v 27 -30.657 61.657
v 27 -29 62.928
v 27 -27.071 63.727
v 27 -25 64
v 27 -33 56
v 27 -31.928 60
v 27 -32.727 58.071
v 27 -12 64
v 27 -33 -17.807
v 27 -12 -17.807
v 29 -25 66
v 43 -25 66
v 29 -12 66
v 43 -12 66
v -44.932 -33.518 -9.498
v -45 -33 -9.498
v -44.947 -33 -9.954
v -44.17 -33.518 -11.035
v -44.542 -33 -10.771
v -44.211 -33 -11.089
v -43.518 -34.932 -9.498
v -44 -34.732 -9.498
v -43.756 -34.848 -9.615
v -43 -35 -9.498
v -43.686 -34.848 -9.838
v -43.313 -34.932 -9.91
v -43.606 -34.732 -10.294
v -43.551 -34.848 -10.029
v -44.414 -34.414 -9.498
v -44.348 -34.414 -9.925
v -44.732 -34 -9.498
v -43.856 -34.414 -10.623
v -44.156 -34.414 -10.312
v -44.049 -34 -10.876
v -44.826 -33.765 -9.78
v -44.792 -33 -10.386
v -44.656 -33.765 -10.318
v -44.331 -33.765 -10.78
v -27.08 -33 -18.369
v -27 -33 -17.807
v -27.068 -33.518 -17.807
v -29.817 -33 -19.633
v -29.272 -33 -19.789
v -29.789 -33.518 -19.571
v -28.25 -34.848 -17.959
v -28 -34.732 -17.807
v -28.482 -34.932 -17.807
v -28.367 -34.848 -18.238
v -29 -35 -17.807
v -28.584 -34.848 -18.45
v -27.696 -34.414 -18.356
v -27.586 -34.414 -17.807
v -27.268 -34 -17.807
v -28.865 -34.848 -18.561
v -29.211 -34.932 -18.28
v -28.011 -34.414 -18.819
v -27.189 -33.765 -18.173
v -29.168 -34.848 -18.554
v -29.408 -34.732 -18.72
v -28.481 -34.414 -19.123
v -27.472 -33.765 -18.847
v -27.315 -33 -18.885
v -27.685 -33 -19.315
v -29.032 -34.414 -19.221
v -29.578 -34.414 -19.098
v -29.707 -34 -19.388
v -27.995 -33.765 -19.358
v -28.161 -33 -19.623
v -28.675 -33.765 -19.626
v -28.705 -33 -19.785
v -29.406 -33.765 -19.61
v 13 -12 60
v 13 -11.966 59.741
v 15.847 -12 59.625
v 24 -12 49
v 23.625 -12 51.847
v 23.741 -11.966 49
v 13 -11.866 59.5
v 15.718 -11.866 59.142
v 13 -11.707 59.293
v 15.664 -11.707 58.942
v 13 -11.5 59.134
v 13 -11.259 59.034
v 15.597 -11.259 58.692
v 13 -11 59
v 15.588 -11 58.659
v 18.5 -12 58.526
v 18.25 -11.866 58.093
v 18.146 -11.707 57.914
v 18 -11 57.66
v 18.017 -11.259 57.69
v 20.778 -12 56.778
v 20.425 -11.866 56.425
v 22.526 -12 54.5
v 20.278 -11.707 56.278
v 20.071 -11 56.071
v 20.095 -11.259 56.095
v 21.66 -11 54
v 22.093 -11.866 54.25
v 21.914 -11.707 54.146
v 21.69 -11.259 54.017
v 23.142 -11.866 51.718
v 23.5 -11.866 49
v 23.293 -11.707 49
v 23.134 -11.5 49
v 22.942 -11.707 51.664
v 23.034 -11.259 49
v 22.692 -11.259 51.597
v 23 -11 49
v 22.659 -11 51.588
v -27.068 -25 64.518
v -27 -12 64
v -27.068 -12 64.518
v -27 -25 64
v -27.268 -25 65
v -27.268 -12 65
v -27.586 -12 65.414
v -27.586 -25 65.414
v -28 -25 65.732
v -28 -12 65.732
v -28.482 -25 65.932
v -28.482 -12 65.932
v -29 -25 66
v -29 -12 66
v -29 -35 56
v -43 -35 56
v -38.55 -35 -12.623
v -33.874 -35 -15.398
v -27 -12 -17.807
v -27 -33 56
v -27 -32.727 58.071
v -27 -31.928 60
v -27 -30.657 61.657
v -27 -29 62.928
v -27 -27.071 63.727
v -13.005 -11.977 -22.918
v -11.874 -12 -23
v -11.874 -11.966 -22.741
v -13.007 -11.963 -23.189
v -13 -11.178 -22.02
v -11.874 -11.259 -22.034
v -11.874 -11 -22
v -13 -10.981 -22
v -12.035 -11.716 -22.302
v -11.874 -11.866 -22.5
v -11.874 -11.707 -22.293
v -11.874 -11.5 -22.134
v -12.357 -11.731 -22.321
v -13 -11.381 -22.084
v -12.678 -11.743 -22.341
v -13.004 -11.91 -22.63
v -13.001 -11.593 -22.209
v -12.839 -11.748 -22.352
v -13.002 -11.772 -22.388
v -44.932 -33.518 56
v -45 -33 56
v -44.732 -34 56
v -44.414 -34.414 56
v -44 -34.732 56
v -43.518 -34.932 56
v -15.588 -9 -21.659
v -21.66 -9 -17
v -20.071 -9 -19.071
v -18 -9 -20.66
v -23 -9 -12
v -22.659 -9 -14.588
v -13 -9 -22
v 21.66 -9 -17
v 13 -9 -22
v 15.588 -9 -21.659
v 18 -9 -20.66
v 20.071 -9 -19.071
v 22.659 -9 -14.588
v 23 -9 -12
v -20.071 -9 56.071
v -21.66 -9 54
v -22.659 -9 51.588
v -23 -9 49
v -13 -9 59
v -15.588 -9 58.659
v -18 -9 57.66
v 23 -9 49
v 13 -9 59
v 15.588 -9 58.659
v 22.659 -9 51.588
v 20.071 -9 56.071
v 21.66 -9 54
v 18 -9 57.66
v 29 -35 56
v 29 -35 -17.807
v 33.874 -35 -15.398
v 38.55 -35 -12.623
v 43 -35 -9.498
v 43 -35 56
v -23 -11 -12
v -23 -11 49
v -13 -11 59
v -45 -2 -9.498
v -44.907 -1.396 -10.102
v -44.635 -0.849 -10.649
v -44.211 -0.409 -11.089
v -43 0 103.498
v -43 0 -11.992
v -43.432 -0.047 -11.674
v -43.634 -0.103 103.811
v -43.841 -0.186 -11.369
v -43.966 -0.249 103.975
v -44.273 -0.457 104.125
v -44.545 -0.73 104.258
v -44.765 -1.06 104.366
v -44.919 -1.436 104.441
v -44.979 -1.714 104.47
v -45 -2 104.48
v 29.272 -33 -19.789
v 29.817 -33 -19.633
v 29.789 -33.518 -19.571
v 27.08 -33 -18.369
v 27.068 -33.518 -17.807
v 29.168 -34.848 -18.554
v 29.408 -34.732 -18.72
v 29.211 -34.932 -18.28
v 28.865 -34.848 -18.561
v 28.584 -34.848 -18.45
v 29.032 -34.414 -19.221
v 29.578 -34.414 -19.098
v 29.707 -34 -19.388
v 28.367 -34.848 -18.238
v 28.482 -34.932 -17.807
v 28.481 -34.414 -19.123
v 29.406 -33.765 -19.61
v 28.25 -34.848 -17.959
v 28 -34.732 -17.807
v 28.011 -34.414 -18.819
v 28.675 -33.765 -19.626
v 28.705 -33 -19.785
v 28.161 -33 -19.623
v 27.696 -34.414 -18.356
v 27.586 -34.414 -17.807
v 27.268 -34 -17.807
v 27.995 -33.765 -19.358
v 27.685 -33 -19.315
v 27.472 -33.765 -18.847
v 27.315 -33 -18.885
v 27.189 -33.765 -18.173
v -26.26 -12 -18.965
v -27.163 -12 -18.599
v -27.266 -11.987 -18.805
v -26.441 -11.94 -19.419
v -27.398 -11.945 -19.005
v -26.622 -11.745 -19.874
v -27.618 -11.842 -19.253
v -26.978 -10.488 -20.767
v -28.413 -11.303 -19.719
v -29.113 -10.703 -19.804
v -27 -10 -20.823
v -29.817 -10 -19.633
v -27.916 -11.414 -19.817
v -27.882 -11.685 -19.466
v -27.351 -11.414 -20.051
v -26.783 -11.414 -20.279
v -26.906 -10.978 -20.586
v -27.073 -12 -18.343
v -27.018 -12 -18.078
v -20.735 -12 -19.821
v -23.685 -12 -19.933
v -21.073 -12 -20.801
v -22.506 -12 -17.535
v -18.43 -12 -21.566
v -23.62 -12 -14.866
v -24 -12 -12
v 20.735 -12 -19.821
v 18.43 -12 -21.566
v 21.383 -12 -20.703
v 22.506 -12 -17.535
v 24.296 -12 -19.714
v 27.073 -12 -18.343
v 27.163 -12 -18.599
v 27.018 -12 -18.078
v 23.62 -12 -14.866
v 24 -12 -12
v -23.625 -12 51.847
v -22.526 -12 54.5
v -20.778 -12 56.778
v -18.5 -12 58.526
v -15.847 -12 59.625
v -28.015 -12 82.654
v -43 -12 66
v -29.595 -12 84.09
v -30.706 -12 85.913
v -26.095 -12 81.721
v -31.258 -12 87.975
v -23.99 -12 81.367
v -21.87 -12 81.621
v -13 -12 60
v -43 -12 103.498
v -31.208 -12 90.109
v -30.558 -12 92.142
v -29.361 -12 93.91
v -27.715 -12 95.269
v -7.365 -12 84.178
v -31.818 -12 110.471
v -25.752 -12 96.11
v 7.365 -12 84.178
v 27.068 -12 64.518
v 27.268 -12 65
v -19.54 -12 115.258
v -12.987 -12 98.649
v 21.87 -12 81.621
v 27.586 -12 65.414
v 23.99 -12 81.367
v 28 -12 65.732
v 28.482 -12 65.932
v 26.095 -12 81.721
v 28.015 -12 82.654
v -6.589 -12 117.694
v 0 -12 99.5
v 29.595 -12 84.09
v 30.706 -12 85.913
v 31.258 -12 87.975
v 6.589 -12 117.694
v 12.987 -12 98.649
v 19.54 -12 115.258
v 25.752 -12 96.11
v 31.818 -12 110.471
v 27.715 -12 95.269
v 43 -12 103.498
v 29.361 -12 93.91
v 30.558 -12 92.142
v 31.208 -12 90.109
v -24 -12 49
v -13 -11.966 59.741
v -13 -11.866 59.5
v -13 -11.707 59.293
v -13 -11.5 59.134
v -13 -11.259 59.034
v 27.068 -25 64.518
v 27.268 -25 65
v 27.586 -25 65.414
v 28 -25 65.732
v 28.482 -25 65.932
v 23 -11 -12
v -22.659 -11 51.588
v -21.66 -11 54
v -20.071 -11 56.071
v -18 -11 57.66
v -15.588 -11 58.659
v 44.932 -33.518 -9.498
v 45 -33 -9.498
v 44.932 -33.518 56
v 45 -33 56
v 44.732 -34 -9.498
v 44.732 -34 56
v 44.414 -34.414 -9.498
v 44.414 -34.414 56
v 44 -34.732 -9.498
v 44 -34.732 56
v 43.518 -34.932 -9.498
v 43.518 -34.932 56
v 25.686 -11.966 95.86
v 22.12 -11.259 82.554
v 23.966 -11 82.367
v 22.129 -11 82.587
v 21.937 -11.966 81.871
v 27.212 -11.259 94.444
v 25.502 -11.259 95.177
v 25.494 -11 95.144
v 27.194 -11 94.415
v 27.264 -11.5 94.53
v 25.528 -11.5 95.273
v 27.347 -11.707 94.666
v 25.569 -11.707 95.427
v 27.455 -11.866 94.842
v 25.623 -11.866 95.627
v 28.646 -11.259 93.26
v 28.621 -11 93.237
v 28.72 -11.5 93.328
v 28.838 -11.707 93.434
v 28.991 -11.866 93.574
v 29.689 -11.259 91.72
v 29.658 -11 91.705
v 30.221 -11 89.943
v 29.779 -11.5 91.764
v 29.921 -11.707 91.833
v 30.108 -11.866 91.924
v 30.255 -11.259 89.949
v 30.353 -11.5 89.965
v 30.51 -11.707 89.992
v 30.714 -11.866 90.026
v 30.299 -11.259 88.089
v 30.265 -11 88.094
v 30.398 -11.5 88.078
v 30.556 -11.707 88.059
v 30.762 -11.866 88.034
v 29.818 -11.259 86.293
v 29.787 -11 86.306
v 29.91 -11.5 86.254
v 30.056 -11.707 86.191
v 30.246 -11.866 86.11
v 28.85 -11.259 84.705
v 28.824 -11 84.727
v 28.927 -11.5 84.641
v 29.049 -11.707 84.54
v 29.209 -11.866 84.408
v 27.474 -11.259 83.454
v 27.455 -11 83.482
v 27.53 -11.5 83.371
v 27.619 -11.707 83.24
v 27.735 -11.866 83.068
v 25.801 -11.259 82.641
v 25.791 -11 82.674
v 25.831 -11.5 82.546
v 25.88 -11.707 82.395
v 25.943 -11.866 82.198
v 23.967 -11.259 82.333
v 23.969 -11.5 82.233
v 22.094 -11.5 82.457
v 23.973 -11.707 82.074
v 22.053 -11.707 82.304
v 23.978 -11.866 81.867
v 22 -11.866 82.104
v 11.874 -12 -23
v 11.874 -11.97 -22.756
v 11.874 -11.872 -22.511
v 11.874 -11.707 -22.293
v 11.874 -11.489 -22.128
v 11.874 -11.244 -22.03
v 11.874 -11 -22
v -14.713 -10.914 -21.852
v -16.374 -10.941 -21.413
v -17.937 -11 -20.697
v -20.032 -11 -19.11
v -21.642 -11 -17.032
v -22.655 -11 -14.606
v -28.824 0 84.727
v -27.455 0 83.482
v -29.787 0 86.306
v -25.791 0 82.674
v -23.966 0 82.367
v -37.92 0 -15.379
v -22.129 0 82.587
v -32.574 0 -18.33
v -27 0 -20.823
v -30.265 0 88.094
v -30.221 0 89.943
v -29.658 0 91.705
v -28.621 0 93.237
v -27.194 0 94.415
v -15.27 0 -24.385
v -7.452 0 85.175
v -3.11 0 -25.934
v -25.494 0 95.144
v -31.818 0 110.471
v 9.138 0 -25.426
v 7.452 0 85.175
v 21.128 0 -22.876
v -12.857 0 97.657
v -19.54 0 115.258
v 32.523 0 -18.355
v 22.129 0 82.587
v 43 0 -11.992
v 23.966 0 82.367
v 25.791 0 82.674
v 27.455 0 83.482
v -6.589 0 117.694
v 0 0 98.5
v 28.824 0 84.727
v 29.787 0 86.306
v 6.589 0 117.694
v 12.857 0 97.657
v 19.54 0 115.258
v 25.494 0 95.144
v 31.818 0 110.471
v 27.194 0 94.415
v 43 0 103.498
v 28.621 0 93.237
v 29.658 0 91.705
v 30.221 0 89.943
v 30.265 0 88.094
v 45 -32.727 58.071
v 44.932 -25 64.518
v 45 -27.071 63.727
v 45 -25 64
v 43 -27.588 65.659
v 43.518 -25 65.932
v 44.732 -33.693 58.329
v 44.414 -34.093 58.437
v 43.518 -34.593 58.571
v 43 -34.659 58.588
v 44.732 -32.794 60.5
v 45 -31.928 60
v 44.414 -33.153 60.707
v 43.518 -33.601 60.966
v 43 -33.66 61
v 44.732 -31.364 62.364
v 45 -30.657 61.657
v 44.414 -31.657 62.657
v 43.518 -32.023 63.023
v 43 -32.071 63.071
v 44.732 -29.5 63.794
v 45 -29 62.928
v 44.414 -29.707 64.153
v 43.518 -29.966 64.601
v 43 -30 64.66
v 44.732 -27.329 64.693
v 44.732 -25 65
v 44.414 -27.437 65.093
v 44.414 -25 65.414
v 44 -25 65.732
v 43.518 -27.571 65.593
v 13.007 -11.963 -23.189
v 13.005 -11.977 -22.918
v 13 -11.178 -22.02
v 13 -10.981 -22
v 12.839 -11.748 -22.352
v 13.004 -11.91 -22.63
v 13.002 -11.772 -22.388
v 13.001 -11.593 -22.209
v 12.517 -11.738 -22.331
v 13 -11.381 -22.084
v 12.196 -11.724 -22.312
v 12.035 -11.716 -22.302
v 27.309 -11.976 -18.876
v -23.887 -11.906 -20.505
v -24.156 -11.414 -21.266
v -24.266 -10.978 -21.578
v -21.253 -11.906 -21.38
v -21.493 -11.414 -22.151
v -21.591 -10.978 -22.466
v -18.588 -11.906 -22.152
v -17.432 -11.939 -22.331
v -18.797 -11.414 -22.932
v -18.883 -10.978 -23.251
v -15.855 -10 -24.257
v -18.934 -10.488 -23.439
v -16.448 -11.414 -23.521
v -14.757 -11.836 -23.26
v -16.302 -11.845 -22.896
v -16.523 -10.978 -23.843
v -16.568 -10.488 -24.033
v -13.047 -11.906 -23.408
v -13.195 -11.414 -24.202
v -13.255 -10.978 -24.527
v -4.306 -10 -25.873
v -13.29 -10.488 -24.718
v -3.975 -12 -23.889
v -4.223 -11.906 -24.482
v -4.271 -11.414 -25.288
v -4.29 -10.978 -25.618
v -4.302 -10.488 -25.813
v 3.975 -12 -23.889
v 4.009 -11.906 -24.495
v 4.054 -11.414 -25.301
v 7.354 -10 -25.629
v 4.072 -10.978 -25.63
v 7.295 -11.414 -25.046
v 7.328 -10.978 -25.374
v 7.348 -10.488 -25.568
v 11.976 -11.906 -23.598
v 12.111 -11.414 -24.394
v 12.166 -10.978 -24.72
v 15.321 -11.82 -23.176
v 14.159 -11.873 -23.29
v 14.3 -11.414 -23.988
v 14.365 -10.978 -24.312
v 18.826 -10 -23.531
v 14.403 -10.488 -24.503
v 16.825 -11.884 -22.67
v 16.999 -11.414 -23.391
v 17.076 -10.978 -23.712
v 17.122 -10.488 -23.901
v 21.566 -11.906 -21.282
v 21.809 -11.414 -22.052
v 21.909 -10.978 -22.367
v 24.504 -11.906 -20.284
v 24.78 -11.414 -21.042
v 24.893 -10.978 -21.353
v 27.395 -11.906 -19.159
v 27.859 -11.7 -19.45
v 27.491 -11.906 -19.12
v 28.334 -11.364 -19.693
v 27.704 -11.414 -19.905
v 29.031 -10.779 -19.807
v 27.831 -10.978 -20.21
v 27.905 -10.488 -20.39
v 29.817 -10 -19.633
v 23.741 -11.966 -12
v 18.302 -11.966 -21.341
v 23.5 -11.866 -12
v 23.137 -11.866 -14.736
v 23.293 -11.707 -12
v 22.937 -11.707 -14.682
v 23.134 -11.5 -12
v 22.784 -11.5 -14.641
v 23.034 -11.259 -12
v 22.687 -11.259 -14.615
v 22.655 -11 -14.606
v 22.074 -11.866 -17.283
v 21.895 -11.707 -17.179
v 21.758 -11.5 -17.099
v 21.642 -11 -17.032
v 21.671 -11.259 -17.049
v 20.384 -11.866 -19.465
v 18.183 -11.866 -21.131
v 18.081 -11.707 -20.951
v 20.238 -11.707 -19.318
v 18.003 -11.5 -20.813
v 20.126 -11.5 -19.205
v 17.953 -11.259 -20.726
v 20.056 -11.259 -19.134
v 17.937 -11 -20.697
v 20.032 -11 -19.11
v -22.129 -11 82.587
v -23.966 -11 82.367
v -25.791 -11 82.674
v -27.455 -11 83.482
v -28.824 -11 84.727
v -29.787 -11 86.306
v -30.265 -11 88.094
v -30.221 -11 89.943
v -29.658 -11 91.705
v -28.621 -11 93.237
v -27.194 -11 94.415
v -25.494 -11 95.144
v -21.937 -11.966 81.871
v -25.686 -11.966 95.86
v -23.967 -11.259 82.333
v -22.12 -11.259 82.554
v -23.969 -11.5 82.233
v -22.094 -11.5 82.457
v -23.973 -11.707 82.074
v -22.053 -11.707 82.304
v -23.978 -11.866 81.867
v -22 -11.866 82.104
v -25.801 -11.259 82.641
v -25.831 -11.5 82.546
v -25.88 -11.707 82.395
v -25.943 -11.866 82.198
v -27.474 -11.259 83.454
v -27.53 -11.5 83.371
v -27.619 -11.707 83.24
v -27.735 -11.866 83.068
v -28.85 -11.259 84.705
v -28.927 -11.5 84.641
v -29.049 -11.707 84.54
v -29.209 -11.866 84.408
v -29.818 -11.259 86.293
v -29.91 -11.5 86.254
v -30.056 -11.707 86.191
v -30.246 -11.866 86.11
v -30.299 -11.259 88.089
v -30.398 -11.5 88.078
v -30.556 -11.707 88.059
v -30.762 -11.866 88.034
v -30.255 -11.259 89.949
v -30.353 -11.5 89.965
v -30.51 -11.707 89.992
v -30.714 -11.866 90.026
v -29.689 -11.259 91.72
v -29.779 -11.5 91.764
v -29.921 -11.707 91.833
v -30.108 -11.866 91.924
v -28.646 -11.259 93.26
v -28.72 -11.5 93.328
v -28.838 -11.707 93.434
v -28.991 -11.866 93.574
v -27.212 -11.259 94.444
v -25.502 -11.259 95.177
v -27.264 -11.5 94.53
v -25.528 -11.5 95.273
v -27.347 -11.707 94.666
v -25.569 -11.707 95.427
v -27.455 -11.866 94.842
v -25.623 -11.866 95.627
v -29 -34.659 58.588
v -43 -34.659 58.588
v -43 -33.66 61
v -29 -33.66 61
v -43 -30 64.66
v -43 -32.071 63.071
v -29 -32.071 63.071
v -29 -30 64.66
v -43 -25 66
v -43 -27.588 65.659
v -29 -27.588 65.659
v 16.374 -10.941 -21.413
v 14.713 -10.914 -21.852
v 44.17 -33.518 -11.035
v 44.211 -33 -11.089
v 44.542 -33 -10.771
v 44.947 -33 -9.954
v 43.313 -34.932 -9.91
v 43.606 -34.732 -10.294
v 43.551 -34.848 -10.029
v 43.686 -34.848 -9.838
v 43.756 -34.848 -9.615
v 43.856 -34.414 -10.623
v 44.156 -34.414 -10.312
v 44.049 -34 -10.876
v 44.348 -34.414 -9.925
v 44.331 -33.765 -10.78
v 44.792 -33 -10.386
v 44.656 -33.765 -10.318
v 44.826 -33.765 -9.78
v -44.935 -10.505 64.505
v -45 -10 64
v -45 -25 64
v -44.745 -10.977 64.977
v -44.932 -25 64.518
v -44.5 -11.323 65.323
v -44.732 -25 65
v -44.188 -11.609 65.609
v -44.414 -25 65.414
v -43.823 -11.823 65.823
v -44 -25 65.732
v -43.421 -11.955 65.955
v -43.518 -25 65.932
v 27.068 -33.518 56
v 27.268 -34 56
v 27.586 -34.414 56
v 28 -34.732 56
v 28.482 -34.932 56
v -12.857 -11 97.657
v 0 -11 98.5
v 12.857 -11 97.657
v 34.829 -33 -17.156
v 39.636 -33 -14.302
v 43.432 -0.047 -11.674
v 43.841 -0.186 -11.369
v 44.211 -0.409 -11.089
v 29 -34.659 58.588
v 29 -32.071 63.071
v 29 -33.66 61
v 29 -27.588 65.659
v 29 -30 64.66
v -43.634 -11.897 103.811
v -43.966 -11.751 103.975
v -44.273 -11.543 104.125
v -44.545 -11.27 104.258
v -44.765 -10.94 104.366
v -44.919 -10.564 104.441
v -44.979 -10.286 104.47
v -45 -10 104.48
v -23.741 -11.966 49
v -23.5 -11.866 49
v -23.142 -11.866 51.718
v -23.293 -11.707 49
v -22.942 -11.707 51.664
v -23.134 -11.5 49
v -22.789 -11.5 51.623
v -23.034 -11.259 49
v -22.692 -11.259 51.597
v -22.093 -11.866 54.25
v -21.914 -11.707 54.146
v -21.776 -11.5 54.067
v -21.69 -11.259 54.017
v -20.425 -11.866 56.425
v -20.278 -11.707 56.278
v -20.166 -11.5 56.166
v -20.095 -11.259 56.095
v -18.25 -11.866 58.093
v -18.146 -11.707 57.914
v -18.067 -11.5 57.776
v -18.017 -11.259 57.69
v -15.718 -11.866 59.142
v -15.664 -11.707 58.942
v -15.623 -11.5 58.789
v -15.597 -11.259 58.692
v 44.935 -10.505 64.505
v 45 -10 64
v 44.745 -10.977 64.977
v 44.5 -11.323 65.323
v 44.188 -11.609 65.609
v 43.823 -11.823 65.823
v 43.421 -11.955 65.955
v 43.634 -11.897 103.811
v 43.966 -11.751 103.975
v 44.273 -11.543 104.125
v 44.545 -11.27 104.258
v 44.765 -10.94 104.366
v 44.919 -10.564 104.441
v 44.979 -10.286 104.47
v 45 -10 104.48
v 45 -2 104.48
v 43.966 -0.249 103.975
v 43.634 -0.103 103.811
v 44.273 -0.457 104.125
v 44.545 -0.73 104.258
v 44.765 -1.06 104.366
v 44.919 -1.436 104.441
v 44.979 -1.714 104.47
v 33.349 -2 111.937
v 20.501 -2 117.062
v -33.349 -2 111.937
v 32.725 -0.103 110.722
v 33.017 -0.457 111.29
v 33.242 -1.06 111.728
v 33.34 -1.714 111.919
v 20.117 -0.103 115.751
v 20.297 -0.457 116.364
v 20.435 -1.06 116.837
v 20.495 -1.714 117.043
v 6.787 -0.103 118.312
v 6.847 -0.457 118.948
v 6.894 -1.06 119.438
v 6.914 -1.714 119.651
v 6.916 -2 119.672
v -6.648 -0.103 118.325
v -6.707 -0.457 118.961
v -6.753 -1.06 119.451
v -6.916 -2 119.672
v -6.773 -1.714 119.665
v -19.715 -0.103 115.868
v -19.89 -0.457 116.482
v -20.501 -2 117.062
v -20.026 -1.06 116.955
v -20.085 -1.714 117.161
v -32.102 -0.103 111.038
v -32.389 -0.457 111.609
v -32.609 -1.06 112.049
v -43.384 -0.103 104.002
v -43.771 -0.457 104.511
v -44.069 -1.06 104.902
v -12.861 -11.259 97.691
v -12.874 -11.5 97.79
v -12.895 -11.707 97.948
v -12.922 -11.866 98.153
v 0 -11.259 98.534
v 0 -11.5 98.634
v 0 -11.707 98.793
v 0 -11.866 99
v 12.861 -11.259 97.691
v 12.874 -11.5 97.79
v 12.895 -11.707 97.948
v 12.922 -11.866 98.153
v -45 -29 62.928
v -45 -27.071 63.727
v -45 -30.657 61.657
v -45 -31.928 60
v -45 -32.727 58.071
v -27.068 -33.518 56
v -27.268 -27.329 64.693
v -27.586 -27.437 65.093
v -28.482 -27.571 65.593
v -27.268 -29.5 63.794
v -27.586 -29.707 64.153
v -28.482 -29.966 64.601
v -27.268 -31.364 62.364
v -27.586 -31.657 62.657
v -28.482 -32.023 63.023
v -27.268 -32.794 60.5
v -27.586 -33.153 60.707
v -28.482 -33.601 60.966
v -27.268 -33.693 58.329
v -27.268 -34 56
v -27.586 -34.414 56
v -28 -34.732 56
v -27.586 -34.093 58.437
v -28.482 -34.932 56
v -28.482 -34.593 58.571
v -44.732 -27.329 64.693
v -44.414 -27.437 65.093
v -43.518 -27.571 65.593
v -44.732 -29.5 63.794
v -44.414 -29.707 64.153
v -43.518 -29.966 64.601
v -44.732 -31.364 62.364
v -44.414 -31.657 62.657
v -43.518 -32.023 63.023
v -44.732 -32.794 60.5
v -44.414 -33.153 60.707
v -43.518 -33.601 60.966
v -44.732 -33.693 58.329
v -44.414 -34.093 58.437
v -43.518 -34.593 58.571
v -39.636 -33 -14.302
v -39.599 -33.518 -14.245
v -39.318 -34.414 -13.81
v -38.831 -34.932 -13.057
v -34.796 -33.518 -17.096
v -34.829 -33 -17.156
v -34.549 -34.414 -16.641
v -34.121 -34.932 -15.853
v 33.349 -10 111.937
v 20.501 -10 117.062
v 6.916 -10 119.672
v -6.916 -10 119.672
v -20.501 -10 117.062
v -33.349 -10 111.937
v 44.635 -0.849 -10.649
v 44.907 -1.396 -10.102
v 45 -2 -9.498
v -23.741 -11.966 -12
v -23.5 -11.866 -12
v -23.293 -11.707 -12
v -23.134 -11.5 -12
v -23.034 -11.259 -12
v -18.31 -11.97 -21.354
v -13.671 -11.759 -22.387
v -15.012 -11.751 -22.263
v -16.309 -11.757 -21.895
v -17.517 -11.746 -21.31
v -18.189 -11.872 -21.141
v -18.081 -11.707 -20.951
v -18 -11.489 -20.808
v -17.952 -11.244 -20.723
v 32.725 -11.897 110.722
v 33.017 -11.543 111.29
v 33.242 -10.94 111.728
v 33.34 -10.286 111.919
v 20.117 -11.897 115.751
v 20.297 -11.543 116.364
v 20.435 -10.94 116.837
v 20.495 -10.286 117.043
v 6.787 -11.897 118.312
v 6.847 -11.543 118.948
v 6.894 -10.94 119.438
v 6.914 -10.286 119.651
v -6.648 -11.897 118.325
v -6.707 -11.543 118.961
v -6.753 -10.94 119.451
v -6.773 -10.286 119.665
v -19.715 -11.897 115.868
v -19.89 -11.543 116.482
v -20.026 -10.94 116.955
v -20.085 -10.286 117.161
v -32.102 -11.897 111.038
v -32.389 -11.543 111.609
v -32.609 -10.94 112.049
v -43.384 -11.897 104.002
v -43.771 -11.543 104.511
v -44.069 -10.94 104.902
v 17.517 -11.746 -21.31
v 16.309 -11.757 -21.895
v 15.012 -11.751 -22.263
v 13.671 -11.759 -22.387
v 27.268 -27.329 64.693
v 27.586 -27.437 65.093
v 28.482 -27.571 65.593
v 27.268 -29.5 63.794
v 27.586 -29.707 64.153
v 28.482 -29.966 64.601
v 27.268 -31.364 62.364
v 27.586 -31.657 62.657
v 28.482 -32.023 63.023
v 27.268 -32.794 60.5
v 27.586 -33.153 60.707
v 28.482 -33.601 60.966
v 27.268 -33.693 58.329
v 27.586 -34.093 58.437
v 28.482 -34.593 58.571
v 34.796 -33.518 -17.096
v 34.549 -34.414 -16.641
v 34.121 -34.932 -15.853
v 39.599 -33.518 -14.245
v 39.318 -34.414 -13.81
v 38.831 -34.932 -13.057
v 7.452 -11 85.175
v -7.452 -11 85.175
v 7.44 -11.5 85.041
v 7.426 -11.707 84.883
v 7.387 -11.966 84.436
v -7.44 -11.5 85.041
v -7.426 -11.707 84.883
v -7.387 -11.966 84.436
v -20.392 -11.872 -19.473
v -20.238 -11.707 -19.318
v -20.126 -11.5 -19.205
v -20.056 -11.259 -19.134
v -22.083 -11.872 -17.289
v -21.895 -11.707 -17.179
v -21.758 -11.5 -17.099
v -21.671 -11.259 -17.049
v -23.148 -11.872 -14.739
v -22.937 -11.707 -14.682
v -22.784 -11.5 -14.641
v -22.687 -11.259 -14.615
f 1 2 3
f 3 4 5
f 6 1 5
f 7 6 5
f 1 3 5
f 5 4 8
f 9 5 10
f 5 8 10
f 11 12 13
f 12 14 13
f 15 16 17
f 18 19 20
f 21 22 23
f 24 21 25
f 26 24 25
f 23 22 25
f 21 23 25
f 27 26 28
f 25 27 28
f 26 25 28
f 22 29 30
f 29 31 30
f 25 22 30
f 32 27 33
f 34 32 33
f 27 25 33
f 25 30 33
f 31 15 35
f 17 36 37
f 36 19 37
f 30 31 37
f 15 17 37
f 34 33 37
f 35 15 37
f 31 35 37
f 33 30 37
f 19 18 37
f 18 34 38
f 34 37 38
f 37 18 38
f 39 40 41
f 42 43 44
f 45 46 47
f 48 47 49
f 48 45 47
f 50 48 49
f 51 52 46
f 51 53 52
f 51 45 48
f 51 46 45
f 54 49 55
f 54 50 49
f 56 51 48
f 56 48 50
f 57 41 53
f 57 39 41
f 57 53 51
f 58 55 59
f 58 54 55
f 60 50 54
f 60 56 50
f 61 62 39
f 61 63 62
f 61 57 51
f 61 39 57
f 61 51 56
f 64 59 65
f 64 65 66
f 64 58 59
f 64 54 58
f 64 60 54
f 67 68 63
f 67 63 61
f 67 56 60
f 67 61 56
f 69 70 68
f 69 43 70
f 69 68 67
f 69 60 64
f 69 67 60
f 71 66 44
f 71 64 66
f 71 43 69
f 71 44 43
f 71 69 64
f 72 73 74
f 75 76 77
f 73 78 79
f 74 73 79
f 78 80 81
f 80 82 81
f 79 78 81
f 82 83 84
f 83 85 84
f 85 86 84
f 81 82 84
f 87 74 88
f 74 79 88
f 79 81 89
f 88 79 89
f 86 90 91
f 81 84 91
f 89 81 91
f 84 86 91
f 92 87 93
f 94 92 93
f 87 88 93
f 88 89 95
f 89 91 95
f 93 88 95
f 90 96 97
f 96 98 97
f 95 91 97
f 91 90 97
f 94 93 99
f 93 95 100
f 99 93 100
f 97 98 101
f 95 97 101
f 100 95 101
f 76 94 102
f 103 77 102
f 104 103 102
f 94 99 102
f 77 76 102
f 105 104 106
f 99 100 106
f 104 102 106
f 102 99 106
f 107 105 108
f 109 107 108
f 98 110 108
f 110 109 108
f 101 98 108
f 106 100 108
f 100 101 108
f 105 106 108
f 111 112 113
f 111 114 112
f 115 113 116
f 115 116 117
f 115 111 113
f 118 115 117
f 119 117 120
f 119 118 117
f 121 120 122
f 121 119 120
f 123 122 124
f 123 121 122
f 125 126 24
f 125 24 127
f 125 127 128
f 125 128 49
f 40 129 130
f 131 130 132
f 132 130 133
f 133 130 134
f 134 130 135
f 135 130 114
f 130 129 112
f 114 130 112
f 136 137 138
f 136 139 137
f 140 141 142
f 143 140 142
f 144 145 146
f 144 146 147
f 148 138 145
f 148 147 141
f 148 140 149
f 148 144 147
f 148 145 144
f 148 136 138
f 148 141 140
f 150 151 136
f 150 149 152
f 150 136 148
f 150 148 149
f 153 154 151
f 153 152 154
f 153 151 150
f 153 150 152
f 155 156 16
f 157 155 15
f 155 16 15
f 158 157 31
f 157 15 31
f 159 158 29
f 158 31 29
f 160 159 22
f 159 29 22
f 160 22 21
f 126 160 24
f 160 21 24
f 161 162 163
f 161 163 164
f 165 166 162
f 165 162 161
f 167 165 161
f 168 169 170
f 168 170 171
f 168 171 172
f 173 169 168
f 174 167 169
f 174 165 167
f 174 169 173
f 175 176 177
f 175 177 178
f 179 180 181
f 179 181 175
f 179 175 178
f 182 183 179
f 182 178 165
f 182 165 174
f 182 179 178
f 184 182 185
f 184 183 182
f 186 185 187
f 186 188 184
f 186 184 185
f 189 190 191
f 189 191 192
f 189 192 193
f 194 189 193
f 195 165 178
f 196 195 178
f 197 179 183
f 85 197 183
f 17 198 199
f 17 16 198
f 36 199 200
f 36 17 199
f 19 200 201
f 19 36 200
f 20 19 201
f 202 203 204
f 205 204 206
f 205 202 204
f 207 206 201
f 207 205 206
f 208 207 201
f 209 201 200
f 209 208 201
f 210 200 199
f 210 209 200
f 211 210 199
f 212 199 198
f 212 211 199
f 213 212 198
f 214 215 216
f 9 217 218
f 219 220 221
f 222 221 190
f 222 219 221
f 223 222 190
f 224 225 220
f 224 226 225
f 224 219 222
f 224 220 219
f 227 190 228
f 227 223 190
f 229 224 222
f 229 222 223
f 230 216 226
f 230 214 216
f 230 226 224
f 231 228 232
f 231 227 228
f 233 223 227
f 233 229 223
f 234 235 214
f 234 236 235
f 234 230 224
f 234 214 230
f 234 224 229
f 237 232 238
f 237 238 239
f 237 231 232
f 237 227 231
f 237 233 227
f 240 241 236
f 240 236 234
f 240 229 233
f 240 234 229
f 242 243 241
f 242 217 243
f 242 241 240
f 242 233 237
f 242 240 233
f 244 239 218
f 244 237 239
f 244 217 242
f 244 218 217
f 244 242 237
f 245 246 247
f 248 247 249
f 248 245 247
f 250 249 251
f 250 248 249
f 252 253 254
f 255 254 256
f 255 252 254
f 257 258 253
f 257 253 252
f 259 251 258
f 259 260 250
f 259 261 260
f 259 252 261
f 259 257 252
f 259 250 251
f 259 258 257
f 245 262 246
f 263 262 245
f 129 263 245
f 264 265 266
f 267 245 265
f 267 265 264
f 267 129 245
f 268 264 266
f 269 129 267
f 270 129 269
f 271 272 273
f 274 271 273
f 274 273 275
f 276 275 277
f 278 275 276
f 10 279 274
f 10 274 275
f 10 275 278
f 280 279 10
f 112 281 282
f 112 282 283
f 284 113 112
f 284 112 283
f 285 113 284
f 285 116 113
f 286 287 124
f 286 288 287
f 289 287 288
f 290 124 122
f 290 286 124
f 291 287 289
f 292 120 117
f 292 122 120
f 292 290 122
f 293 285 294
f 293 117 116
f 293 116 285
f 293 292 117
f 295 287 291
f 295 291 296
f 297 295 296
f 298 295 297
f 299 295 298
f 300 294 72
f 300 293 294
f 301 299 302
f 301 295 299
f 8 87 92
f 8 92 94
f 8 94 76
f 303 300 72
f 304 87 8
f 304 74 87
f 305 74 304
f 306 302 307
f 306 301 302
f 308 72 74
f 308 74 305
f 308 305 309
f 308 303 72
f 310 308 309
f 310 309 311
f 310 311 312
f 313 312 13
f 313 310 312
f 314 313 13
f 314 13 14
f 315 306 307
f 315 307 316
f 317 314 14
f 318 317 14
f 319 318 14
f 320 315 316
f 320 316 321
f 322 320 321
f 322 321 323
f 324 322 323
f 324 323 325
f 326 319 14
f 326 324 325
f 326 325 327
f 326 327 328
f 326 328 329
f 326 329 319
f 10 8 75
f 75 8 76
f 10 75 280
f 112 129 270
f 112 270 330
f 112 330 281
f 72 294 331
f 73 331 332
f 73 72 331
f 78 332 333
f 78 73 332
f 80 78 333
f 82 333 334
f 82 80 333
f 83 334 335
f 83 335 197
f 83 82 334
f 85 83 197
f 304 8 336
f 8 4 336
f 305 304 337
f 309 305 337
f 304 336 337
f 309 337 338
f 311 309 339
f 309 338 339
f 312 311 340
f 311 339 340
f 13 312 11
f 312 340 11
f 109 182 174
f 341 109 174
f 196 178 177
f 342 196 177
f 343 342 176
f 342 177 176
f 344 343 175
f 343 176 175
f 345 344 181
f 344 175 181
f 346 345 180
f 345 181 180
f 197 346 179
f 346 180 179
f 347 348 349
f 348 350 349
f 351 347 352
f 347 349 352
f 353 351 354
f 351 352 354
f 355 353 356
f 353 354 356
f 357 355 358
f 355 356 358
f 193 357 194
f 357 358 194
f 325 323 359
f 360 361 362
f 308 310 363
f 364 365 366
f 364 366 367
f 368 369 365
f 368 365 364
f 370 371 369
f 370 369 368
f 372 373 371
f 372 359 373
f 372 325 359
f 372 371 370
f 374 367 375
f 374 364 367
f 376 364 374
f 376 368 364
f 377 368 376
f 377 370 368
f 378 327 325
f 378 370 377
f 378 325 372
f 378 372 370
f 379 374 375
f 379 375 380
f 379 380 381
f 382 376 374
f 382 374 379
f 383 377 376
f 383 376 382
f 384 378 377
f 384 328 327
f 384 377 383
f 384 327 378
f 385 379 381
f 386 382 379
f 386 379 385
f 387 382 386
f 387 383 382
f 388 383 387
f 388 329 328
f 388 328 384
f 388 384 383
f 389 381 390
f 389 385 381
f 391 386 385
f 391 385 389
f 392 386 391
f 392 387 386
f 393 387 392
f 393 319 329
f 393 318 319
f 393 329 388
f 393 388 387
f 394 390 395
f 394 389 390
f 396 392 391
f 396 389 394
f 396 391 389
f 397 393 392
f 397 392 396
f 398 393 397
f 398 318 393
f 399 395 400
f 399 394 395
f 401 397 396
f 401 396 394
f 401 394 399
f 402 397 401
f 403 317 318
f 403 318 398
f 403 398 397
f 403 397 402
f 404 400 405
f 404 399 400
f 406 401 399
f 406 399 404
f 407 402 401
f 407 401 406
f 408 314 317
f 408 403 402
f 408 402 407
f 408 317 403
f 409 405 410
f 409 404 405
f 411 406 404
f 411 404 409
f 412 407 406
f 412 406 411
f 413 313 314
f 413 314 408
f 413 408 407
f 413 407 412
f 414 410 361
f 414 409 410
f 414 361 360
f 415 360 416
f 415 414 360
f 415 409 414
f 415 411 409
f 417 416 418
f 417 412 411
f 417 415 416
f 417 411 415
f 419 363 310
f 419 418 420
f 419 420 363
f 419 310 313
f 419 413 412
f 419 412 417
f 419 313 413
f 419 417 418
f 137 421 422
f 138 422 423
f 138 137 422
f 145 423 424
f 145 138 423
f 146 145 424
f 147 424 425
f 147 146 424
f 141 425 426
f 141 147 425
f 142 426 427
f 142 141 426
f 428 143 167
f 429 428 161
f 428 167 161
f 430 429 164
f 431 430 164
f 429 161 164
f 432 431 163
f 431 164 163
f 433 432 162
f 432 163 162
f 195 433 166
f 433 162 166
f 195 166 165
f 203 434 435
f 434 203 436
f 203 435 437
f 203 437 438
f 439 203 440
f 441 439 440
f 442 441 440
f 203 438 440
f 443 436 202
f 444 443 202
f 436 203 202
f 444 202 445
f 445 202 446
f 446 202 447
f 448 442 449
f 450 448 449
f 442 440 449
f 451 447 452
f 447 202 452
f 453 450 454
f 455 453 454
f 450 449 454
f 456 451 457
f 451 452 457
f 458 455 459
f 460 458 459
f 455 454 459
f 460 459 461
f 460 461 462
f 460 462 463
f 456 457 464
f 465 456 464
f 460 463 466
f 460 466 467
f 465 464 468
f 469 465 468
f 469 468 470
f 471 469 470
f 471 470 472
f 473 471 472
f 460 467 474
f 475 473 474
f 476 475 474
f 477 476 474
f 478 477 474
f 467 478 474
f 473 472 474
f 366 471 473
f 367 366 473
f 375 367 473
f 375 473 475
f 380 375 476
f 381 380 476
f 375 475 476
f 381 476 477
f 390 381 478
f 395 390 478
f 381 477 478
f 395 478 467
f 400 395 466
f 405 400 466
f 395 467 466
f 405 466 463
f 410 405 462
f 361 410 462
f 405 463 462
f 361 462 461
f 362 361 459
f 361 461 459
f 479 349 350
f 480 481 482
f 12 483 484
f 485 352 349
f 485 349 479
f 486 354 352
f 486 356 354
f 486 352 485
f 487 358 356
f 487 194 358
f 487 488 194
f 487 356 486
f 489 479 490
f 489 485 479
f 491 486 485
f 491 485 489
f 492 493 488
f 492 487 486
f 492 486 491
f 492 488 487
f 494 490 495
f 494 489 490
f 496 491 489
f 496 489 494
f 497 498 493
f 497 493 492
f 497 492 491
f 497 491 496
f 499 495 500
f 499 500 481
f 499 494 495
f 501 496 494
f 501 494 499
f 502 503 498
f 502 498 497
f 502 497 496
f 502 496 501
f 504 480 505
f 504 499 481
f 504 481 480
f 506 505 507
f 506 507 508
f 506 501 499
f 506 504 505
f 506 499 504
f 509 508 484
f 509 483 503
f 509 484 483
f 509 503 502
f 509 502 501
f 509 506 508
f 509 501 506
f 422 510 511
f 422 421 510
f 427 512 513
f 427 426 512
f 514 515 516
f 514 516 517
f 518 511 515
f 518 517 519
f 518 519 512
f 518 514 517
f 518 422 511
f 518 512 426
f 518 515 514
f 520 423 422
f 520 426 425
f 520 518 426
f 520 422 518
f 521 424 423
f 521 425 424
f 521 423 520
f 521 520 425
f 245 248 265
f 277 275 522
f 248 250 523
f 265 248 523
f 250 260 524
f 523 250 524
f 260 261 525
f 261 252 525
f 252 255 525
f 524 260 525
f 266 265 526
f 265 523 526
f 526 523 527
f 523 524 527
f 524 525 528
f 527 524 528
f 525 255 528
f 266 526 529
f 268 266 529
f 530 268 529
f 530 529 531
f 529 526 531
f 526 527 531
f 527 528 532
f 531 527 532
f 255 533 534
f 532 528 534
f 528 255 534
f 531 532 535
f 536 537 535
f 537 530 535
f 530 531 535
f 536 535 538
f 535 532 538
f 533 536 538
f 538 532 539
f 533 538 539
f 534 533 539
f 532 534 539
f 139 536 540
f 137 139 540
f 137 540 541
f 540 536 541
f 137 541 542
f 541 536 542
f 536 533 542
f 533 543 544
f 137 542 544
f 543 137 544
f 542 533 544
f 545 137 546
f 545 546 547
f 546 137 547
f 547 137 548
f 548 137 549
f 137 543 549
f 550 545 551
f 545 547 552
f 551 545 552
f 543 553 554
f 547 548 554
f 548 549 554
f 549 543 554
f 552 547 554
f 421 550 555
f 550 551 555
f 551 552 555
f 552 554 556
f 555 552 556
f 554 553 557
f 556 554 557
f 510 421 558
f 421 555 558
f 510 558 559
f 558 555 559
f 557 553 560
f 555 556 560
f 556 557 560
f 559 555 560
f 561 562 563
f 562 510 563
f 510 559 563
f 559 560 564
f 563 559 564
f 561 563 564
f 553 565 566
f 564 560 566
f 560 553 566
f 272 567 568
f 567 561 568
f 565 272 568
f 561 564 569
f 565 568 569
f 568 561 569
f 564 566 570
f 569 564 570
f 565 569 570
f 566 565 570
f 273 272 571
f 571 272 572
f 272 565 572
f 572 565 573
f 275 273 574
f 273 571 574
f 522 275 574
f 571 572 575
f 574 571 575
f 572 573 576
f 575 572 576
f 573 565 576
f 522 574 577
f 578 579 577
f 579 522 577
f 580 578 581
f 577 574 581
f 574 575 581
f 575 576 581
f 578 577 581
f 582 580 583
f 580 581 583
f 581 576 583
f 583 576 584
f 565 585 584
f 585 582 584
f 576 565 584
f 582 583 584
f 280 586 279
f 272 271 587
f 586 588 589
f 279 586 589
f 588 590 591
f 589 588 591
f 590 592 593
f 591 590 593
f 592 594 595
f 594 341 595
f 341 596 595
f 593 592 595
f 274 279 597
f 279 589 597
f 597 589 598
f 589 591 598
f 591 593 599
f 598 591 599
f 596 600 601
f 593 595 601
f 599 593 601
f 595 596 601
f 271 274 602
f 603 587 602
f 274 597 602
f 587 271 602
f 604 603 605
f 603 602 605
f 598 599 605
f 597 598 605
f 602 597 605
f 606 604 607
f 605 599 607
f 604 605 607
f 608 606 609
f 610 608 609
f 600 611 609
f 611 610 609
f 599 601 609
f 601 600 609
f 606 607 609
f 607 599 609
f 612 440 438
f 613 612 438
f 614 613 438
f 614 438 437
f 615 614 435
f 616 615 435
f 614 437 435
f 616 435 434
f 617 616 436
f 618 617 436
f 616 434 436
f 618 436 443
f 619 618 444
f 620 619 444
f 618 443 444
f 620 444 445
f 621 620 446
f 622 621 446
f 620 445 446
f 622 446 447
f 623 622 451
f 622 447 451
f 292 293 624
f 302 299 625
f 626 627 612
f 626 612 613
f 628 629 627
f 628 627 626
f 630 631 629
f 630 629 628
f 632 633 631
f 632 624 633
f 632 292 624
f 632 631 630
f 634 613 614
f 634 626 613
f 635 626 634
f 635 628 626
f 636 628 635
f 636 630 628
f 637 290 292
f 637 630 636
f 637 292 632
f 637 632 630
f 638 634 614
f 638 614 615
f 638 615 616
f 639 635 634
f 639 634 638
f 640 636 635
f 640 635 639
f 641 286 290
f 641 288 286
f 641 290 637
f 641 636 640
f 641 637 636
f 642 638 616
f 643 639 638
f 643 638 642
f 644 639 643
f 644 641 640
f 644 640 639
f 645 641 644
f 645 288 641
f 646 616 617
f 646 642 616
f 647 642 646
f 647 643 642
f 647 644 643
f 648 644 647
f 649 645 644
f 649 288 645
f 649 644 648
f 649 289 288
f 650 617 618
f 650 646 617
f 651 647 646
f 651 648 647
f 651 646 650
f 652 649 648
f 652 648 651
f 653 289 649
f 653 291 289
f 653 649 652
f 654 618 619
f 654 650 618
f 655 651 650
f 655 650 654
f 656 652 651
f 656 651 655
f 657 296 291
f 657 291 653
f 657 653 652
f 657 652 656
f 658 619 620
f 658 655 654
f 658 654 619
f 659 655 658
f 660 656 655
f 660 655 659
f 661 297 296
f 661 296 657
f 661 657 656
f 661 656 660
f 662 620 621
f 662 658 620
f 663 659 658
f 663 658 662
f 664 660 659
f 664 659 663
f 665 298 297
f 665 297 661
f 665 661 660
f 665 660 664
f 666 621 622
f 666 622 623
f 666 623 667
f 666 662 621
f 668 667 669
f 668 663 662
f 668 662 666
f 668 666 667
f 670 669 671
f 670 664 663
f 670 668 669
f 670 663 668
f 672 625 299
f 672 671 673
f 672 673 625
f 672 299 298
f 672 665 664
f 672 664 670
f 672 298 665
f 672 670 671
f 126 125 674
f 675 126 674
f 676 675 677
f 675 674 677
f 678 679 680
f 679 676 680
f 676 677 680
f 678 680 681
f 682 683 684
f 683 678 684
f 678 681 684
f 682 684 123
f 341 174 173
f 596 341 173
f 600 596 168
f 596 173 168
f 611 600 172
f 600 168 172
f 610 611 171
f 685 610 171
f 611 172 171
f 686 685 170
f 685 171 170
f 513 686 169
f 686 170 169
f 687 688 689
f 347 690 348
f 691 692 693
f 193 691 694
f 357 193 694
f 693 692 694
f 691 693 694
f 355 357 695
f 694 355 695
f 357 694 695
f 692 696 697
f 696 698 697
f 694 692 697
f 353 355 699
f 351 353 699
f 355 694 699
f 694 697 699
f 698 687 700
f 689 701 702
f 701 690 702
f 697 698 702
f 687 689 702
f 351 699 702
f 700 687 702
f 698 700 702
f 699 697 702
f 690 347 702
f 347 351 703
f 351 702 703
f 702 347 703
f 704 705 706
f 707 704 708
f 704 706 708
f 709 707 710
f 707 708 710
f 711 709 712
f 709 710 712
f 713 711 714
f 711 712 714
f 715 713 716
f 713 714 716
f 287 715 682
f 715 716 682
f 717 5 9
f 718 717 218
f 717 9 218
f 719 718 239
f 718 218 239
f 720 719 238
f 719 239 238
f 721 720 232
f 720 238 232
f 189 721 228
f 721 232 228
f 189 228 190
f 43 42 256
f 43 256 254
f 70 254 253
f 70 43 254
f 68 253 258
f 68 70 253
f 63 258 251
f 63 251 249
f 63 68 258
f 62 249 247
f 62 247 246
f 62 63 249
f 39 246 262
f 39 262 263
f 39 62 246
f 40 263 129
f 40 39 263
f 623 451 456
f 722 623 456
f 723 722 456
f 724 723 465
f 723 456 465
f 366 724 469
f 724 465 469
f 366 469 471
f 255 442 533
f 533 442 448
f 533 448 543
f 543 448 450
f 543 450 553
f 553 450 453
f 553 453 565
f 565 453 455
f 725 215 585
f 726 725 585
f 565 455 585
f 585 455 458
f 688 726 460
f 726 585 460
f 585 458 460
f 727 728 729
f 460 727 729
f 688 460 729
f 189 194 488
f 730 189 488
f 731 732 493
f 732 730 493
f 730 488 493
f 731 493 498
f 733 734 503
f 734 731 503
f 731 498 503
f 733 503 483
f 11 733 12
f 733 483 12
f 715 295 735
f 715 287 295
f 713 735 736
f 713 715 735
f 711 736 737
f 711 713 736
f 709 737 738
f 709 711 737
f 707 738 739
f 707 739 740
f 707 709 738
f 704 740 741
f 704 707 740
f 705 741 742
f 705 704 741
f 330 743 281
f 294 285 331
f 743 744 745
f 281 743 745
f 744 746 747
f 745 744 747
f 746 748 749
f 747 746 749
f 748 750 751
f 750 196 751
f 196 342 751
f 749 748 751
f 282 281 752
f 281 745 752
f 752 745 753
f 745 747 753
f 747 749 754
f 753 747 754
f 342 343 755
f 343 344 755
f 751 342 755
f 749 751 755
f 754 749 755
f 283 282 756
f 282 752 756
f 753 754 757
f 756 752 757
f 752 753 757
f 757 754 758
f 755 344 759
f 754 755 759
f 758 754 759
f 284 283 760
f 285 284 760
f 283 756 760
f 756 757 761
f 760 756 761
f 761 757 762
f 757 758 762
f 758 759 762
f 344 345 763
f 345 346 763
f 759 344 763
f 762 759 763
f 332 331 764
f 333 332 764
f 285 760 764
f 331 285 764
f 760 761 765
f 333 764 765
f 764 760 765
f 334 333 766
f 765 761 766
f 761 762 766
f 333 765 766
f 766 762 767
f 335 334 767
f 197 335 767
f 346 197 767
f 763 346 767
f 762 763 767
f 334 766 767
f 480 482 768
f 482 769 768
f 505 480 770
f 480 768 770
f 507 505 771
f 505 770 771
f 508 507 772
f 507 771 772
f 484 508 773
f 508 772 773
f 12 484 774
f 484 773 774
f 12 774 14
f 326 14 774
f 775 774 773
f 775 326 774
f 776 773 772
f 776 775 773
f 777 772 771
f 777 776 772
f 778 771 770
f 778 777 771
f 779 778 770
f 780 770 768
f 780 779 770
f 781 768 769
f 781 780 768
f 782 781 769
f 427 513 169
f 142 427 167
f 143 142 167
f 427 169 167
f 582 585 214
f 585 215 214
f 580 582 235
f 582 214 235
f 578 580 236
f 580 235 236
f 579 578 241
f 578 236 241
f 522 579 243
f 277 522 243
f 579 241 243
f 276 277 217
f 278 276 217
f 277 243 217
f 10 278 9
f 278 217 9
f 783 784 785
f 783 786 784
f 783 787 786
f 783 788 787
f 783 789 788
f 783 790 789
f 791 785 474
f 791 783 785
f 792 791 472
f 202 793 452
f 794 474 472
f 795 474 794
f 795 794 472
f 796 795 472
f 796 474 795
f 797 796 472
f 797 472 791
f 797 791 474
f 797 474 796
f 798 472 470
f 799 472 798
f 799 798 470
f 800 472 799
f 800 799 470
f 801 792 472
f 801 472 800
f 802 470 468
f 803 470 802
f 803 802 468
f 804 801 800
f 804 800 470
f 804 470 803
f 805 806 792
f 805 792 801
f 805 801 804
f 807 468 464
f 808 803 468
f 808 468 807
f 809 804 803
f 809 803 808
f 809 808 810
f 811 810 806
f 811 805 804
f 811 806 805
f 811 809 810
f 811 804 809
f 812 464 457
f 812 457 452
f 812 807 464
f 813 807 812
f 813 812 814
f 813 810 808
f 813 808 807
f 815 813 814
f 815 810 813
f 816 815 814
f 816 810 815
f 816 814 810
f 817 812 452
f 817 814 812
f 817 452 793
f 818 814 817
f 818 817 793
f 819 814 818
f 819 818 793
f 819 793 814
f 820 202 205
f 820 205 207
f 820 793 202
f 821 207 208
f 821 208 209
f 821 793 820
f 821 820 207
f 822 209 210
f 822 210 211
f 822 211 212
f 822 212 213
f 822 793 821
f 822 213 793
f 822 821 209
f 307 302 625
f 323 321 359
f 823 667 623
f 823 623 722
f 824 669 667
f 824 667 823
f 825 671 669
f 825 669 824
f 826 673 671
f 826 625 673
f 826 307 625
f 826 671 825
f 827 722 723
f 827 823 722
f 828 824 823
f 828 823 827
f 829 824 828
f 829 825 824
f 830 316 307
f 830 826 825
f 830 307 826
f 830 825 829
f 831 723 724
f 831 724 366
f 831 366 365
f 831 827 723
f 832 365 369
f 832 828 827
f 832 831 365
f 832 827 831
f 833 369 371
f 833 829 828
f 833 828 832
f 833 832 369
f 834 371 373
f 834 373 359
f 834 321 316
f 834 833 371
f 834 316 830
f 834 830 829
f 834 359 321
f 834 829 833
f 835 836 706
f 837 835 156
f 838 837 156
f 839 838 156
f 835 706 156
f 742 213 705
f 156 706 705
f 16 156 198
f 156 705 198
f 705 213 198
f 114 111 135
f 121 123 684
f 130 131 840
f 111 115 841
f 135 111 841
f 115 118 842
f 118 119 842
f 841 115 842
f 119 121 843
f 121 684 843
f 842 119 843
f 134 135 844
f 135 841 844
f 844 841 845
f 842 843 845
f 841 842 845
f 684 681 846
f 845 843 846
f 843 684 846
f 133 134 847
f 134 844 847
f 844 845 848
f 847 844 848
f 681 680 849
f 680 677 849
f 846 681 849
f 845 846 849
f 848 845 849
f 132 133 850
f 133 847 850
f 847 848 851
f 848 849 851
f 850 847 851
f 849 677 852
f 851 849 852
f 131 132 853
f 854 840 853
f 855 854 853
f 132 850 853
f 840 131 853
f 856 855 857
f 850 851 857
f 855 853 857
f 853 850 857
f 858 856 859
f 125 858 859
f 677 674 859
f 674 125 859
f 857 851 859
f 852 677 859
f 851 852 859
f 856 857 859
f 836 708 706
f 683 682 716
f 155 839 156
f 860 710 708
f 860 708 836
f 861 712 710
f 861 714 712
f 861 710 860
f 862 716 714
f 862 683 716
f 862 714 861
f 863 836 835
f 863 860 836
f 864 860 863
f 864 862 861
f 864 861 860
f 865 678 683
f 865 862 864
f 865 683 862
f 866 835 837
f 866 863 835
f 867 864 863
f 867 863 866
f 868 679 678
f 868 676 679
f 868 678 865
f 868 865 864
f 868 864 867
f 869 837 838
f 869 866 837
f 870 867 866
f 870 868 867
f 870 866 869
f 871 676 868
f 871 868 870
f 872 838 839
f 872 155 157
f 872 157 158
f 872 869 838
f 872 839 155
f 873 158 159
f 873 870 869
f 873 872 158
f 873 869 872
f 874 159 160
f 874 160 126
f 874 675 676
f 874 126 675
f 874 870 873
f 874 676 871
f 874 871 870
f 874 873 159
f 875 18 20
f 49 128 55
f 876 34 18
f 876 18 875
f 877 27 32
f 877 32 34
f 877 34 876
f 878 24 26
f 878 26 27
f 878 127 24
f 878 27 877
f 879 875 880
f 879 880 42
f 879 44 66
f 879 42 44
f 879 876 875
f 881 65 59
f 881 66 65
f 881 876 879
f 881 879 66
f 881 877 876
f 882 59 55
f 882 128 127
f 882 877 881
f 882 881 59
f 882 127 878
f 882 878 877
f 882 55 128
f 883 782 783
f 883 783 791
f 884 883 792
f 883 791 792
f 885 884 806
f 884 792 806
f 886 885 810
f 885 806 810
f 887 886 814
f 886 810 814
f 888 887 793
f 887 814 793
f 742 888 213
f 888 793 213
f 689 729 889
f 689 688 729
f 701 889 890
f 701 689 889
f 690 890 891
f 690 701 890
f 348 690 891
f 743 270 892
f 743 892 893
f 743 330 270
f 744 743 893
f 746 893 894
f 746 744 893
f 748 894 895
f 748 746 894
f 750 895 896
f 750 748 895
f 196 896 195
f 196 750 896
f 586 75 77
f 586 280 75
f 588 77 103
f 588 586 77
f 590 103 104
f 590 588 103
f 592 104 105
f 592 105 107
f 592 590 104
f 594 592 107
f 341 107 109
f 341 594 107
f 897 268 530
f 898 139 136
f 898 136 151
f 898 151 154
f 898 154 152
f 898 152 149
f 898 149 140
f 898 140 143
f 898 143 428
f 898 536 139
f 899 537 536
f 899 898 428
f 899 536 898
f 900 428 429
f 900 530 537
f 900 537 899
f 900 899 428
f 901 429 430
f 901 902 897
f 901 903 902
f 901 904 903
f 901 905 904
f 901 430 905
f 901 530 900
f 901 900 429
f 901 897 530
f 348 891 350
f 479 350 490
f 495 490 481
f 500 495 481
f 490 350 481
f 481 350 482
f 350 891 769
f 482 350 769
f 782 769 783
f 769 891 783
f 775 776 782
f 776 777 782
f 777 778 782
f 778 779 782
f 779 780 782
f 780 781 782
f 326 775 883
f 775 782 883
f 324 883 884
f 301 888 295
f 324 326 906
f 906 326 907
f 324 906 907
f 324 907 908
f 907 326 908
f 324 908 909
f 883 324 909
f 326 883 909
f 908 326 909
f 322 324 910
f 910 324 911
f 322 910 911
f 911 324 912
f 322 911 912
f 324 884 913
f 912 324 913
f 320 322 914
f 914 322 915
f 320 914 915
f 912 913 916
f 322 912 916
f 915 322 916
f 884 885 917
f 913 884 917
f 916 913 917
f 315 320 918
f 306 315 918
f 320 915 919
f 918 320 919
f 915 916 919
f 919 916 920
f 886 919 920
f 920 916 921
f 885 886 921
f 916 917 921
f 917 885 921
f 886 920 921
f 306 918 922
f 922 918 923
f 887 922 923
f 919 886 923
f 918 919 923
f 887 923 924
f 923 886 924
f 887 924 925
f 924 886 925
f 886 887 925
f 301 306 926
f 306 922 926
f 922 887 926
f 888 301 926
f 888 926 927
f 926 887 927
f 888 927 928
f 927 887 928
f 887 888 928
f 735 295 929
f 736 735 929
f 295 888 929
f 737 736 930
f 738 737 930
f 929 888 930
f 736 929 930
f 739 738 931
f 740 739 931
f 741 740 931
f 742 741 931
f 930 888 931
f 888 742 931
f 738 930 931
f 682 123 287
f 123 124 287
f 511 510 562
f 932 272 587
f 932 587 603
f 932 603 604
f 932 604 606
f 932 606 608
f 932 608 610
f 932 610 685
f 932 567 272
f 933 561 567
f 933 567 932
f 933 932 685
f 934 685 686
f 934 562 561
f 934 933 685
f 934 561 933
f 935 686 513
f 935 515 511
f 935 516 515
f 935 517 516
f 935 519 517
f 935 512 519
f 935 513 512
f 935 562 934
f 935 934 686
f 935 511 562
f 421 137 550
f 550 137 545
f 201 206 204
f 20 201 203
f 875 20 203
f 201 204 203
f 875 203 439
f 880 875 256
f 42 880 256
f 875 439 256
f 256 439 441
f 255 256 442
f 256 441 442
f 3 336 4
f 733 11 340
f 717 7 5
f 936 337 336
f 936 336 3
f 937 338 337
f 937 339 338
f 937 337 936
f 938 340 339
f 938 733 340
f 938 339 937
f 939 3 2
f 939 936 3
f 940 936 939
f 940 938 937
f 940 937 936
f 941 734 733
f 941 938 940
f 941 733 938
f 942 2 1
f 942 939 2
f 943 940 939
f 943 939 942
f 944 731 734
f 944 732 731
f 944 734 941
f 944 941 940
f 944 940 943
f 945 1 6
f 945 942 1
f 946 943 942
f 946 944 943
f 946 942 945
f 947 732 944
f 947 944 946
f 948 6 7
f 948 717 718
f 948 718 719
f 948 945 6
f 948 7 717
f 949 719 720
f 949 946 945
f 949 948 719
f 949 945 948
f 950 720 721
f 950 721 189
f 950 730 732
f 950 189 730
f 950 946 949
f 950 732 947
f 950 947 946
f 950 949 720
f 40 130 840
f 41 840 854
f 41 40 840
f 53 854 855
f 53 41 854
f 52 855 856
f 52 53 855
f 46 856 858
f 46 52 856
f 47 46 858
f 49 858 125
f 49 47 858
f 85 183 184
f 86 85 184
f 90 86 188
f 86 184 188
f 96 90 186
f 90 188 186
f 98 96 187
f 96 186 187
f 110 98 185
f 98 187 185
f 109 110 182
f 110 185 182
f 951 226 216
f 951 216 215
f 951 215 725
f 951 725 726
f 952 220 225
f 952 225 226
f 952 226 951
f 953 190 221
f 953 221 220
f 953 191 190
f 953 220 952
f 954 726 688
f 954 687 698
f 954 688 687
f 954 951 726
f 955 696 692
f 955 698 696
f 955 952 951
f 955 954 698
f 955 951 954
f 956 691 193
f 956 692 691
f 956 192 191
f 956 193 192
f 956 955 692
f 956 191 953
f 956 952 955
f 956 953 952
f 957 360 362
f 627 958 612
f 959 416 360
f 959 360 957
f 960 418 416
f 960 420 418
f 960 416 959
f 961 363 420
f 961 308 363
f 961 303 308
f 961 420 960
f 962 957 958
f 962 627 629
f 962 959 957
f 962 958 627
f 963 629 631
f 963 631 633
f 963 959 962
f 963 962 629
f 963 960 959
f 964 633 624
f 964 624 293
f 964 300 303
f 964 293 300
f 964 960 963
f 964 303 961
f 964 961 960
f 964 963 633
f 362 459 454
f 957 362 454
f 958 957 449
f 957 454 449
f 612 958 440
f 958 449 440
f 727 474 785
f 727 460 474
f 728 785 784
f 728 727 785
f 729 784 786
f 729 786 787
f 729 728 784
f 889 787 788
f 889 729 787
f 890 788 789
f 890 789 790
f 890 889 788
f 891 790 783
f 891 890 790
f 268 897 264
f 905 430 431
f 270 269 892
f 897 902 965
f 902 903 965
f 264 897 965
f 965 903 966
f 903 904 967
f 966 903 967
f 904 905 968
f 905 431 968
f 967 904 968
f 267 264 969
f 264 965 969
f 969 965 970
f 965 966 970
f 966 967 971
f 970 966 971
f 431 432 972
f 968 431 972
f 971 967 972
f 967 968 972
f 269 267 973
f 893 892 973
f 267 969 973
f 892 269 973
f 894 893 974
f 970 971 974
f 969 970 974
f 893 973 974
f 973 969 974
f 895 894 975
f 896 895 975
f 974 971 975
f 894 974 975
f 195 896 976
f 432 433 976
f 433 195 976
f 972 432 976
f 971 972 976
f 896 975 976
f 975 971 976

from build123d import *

# Parameters (mm, degrees)
F1_DEPTH = 35
F2_DEPTH = 12
F3_DEPTH = 9
F4_R     = 1
F6_DEPTH = 90.001
F7_R     = 2
F8_R     = 1


with BuildPart() as f1:
    # F0 (on Front) → F1 (new body)
    with BuildSketch(Plane.XZ):
        with BuildLine():
            Line((-27, -20.8232998313), (-27, 66))
            Line((-27, 66), (-45, 66))
            Line((-45, 66), (-45, -10.4804314528))
            ThreePointArc((-45, -10.4804314528), (-36.3695440111, -16.2949940234), (-27, -20.8232998313))
        make_face()
    extrude(amount=F1_DEPTH)



with BuildPart() as f1b:
    # F0 (on Front) → F1, piece 2 (new body)
    with BuildSketch(Plane.XZ):
        with BuildLine():
            Line((45, 66), (27, 66))
            Line((27, 66), (27, -20.8232998313))
            ThreePointArc((27, -20.8232998313), (36.3695440111, -16.2949940234), (45, -10.4804314528))
            Line((45, -10.4804314528), (45, 66))
        make_face()
    extrude(amount=F1_DEPTH)


with BuildPart() as f1_1:
    add(f1.part)

    add(f1b.part)  # F2 merges F1b
    # F0 (on Front) → F2 (join)
    with BuildSketch(Plane.XZ):
        with BuildLine():
            Line((27, 66), (-27, 66))
            Line((-27, 66), (-27, -20.8232998313))
            ThreePointArc((-27, -20.8232998313), (-13.745892245, -24.6941451333), (1.888e-07, -26))
            ThreePointArc((1.888e-07, -26), (13.7458924304, -24.6941450977), (27, -20.8232998313))
            Line((27, -20.8232998313), (27, 66))
        make_face()
        with BuildLine():
            ThreePointArc((-23, 49), (-20.0710678119, 56.0710678119), (-13, 59))
            Line((-13, 59), (13, 59))
            ThreePointArc((13, 59), (20.0710678119, 56.0710678119), (23, 49))
            Line((23, 49), (23, -12))
            ThreePointArc((23, -12), (20.0710678119, -19.0710678119), (13, -22))
            Line((13, -22), (-13, -22))
            ThreePointArc((-13, -22), (-20.0710678119, -19.0710678119), (-23, -12))
            Line((-23, -12), (-23, 49))
        make_face(mode=Mode.SUBTRACT)
        with BuildLine():
            Line((-45, 66), (-27, 66))
            Line((-27, 66), (27, 66))
            Line((27, 66), (45, 66))
            Line((45, 66), (45, 104.4804314528))
            ThreePointArc((45, 104.4804314528), (0, 120), (-45, 104.4804314528))
            Line((-45, 104.4804314528), (-45, 66))
        make_face()
        with BuildLine():
            ThreePointArc((-22.1290283563, 82.5866581477), (-30.0898700203, 87.1828522254), (-25.4936759426, 95.1436938895))
            ThreePointArc((-25.4936759426, 95.1436938895), (0, 98.5), (25.4936759426, 95.1436938895))
            ThreePointArc((25.4936759426, 95.1436938895), (30.0898700203, 87.1828522254), (22.1290283563, 82.5866581477))
            ThreePointArc((22.1290283563, 82.5866581477), (0, 85.5), (-22.1290283563, 82.5866581477))
        make_face(mode=Mode.SUBTRACT)
    extrude(amount=F2_DEPTH)

    # F0 (on Front) → F3 (join)
    with BuildSketch(Plane.XZ):
        with BuildLine():
            Line((13, 59), (-13, 59))
            ThreePointArc((-13, 59), (-20.0710678119, 56.0710678119), (-23, 49))
            Line((-23, 49), (-23, -12))
            ThreePointArc((-23, -12), (-20.0710678119, -19.0710678119), (-13, -22))
            Line((-13, -22), (13, -22))
            ThreePointArc((13, -22), (20.0710678119, -19.0710678119), (23, -12))
            Line((23, -12), (23, 49))
            ThreePointArc((23, 49), (20.0710678119, 56.0710678119), (13, 59))
        make_face()
    extrude(amount=F3_DEPTH)

    # F4
    f4_edges = [f1_1.edges().sort_by_distance(p)[0] for p in [
        (0, -12, 85.5),
        (-30.08987, -12, 87.182852),
        (30.08987, -12, 87.182852),
        (0, -12, 98.5),
    ]]
    fillet(f4_edges, radius=F4_R)

    # F5 (on face) → F6 (cut, through all)
    with BuildSketch(Plane.YZ.offset(45)):
        with BuildLine():
            ThreePointArc((-35, 56), (-32.0710678119, 63.0710678119), (-25, 66))
            Line((-25, 66), (-35, 66))
            Line((-35, 66), (-35, 56))
        make_face()
    extrude(amount=-F6_DEPTH, mode=Mode.SUBTRACT)

    # F7
    f7_edges = [f1_1.edges().sort_by_distance(p)[0] for p in [
        (45, -12, 85.240216),
        (0, -12, 120),
        (-45, -12, 85.240216),
        (45, -32.071068, 63.071068),
        (45, -18.5, 66),
        (45, -35, 22.759784),
        (45, -17.5, -10.480431),
        (45, 0, 47),
        (0, 0, 120),
        (-45, 0, 47),
        (-45, -17.5, -10.480431),
        (-45, -35, 22.759784),
        (-45, -32.071068, 63.071068),
        (-45, -18.5, 66),
        (-36.369544, -35, -16.294994),
        (-27, -23.5, -20.8233),
        (0, -12, -26),
        (27, -23.5, -20.8233),
        (36.369544, -35, -16.294994),
        (27, -35, 17.58835),
        (27, -32.071068, 63.071068),
        (27, -18.5, 66),
        (-27, -18.5, 66),
        (-27, -32.071068, 63.071068),
        (-27, -35, 17.58835),
    ]]
    fillet(f7_edges, radius=F7_R)

    # F8
    f8_edges = [f1_1.edges().sort_by_distance(p)[0] for p in [
        (23, -12, 18.5),
        (-20.071068, -12, 56.071068),
        (-23, -12, 18.5),
        (-20.071068, -12, -19.071068),
        (0, -12, -22),
        (20.071068, -12, -19.071068),
        (20.071068, -12, 56.071068),
        (0, -12, 59),
    ]]
    fillet(f8_edges, radius=F8_R)


solid = f1_1.part
